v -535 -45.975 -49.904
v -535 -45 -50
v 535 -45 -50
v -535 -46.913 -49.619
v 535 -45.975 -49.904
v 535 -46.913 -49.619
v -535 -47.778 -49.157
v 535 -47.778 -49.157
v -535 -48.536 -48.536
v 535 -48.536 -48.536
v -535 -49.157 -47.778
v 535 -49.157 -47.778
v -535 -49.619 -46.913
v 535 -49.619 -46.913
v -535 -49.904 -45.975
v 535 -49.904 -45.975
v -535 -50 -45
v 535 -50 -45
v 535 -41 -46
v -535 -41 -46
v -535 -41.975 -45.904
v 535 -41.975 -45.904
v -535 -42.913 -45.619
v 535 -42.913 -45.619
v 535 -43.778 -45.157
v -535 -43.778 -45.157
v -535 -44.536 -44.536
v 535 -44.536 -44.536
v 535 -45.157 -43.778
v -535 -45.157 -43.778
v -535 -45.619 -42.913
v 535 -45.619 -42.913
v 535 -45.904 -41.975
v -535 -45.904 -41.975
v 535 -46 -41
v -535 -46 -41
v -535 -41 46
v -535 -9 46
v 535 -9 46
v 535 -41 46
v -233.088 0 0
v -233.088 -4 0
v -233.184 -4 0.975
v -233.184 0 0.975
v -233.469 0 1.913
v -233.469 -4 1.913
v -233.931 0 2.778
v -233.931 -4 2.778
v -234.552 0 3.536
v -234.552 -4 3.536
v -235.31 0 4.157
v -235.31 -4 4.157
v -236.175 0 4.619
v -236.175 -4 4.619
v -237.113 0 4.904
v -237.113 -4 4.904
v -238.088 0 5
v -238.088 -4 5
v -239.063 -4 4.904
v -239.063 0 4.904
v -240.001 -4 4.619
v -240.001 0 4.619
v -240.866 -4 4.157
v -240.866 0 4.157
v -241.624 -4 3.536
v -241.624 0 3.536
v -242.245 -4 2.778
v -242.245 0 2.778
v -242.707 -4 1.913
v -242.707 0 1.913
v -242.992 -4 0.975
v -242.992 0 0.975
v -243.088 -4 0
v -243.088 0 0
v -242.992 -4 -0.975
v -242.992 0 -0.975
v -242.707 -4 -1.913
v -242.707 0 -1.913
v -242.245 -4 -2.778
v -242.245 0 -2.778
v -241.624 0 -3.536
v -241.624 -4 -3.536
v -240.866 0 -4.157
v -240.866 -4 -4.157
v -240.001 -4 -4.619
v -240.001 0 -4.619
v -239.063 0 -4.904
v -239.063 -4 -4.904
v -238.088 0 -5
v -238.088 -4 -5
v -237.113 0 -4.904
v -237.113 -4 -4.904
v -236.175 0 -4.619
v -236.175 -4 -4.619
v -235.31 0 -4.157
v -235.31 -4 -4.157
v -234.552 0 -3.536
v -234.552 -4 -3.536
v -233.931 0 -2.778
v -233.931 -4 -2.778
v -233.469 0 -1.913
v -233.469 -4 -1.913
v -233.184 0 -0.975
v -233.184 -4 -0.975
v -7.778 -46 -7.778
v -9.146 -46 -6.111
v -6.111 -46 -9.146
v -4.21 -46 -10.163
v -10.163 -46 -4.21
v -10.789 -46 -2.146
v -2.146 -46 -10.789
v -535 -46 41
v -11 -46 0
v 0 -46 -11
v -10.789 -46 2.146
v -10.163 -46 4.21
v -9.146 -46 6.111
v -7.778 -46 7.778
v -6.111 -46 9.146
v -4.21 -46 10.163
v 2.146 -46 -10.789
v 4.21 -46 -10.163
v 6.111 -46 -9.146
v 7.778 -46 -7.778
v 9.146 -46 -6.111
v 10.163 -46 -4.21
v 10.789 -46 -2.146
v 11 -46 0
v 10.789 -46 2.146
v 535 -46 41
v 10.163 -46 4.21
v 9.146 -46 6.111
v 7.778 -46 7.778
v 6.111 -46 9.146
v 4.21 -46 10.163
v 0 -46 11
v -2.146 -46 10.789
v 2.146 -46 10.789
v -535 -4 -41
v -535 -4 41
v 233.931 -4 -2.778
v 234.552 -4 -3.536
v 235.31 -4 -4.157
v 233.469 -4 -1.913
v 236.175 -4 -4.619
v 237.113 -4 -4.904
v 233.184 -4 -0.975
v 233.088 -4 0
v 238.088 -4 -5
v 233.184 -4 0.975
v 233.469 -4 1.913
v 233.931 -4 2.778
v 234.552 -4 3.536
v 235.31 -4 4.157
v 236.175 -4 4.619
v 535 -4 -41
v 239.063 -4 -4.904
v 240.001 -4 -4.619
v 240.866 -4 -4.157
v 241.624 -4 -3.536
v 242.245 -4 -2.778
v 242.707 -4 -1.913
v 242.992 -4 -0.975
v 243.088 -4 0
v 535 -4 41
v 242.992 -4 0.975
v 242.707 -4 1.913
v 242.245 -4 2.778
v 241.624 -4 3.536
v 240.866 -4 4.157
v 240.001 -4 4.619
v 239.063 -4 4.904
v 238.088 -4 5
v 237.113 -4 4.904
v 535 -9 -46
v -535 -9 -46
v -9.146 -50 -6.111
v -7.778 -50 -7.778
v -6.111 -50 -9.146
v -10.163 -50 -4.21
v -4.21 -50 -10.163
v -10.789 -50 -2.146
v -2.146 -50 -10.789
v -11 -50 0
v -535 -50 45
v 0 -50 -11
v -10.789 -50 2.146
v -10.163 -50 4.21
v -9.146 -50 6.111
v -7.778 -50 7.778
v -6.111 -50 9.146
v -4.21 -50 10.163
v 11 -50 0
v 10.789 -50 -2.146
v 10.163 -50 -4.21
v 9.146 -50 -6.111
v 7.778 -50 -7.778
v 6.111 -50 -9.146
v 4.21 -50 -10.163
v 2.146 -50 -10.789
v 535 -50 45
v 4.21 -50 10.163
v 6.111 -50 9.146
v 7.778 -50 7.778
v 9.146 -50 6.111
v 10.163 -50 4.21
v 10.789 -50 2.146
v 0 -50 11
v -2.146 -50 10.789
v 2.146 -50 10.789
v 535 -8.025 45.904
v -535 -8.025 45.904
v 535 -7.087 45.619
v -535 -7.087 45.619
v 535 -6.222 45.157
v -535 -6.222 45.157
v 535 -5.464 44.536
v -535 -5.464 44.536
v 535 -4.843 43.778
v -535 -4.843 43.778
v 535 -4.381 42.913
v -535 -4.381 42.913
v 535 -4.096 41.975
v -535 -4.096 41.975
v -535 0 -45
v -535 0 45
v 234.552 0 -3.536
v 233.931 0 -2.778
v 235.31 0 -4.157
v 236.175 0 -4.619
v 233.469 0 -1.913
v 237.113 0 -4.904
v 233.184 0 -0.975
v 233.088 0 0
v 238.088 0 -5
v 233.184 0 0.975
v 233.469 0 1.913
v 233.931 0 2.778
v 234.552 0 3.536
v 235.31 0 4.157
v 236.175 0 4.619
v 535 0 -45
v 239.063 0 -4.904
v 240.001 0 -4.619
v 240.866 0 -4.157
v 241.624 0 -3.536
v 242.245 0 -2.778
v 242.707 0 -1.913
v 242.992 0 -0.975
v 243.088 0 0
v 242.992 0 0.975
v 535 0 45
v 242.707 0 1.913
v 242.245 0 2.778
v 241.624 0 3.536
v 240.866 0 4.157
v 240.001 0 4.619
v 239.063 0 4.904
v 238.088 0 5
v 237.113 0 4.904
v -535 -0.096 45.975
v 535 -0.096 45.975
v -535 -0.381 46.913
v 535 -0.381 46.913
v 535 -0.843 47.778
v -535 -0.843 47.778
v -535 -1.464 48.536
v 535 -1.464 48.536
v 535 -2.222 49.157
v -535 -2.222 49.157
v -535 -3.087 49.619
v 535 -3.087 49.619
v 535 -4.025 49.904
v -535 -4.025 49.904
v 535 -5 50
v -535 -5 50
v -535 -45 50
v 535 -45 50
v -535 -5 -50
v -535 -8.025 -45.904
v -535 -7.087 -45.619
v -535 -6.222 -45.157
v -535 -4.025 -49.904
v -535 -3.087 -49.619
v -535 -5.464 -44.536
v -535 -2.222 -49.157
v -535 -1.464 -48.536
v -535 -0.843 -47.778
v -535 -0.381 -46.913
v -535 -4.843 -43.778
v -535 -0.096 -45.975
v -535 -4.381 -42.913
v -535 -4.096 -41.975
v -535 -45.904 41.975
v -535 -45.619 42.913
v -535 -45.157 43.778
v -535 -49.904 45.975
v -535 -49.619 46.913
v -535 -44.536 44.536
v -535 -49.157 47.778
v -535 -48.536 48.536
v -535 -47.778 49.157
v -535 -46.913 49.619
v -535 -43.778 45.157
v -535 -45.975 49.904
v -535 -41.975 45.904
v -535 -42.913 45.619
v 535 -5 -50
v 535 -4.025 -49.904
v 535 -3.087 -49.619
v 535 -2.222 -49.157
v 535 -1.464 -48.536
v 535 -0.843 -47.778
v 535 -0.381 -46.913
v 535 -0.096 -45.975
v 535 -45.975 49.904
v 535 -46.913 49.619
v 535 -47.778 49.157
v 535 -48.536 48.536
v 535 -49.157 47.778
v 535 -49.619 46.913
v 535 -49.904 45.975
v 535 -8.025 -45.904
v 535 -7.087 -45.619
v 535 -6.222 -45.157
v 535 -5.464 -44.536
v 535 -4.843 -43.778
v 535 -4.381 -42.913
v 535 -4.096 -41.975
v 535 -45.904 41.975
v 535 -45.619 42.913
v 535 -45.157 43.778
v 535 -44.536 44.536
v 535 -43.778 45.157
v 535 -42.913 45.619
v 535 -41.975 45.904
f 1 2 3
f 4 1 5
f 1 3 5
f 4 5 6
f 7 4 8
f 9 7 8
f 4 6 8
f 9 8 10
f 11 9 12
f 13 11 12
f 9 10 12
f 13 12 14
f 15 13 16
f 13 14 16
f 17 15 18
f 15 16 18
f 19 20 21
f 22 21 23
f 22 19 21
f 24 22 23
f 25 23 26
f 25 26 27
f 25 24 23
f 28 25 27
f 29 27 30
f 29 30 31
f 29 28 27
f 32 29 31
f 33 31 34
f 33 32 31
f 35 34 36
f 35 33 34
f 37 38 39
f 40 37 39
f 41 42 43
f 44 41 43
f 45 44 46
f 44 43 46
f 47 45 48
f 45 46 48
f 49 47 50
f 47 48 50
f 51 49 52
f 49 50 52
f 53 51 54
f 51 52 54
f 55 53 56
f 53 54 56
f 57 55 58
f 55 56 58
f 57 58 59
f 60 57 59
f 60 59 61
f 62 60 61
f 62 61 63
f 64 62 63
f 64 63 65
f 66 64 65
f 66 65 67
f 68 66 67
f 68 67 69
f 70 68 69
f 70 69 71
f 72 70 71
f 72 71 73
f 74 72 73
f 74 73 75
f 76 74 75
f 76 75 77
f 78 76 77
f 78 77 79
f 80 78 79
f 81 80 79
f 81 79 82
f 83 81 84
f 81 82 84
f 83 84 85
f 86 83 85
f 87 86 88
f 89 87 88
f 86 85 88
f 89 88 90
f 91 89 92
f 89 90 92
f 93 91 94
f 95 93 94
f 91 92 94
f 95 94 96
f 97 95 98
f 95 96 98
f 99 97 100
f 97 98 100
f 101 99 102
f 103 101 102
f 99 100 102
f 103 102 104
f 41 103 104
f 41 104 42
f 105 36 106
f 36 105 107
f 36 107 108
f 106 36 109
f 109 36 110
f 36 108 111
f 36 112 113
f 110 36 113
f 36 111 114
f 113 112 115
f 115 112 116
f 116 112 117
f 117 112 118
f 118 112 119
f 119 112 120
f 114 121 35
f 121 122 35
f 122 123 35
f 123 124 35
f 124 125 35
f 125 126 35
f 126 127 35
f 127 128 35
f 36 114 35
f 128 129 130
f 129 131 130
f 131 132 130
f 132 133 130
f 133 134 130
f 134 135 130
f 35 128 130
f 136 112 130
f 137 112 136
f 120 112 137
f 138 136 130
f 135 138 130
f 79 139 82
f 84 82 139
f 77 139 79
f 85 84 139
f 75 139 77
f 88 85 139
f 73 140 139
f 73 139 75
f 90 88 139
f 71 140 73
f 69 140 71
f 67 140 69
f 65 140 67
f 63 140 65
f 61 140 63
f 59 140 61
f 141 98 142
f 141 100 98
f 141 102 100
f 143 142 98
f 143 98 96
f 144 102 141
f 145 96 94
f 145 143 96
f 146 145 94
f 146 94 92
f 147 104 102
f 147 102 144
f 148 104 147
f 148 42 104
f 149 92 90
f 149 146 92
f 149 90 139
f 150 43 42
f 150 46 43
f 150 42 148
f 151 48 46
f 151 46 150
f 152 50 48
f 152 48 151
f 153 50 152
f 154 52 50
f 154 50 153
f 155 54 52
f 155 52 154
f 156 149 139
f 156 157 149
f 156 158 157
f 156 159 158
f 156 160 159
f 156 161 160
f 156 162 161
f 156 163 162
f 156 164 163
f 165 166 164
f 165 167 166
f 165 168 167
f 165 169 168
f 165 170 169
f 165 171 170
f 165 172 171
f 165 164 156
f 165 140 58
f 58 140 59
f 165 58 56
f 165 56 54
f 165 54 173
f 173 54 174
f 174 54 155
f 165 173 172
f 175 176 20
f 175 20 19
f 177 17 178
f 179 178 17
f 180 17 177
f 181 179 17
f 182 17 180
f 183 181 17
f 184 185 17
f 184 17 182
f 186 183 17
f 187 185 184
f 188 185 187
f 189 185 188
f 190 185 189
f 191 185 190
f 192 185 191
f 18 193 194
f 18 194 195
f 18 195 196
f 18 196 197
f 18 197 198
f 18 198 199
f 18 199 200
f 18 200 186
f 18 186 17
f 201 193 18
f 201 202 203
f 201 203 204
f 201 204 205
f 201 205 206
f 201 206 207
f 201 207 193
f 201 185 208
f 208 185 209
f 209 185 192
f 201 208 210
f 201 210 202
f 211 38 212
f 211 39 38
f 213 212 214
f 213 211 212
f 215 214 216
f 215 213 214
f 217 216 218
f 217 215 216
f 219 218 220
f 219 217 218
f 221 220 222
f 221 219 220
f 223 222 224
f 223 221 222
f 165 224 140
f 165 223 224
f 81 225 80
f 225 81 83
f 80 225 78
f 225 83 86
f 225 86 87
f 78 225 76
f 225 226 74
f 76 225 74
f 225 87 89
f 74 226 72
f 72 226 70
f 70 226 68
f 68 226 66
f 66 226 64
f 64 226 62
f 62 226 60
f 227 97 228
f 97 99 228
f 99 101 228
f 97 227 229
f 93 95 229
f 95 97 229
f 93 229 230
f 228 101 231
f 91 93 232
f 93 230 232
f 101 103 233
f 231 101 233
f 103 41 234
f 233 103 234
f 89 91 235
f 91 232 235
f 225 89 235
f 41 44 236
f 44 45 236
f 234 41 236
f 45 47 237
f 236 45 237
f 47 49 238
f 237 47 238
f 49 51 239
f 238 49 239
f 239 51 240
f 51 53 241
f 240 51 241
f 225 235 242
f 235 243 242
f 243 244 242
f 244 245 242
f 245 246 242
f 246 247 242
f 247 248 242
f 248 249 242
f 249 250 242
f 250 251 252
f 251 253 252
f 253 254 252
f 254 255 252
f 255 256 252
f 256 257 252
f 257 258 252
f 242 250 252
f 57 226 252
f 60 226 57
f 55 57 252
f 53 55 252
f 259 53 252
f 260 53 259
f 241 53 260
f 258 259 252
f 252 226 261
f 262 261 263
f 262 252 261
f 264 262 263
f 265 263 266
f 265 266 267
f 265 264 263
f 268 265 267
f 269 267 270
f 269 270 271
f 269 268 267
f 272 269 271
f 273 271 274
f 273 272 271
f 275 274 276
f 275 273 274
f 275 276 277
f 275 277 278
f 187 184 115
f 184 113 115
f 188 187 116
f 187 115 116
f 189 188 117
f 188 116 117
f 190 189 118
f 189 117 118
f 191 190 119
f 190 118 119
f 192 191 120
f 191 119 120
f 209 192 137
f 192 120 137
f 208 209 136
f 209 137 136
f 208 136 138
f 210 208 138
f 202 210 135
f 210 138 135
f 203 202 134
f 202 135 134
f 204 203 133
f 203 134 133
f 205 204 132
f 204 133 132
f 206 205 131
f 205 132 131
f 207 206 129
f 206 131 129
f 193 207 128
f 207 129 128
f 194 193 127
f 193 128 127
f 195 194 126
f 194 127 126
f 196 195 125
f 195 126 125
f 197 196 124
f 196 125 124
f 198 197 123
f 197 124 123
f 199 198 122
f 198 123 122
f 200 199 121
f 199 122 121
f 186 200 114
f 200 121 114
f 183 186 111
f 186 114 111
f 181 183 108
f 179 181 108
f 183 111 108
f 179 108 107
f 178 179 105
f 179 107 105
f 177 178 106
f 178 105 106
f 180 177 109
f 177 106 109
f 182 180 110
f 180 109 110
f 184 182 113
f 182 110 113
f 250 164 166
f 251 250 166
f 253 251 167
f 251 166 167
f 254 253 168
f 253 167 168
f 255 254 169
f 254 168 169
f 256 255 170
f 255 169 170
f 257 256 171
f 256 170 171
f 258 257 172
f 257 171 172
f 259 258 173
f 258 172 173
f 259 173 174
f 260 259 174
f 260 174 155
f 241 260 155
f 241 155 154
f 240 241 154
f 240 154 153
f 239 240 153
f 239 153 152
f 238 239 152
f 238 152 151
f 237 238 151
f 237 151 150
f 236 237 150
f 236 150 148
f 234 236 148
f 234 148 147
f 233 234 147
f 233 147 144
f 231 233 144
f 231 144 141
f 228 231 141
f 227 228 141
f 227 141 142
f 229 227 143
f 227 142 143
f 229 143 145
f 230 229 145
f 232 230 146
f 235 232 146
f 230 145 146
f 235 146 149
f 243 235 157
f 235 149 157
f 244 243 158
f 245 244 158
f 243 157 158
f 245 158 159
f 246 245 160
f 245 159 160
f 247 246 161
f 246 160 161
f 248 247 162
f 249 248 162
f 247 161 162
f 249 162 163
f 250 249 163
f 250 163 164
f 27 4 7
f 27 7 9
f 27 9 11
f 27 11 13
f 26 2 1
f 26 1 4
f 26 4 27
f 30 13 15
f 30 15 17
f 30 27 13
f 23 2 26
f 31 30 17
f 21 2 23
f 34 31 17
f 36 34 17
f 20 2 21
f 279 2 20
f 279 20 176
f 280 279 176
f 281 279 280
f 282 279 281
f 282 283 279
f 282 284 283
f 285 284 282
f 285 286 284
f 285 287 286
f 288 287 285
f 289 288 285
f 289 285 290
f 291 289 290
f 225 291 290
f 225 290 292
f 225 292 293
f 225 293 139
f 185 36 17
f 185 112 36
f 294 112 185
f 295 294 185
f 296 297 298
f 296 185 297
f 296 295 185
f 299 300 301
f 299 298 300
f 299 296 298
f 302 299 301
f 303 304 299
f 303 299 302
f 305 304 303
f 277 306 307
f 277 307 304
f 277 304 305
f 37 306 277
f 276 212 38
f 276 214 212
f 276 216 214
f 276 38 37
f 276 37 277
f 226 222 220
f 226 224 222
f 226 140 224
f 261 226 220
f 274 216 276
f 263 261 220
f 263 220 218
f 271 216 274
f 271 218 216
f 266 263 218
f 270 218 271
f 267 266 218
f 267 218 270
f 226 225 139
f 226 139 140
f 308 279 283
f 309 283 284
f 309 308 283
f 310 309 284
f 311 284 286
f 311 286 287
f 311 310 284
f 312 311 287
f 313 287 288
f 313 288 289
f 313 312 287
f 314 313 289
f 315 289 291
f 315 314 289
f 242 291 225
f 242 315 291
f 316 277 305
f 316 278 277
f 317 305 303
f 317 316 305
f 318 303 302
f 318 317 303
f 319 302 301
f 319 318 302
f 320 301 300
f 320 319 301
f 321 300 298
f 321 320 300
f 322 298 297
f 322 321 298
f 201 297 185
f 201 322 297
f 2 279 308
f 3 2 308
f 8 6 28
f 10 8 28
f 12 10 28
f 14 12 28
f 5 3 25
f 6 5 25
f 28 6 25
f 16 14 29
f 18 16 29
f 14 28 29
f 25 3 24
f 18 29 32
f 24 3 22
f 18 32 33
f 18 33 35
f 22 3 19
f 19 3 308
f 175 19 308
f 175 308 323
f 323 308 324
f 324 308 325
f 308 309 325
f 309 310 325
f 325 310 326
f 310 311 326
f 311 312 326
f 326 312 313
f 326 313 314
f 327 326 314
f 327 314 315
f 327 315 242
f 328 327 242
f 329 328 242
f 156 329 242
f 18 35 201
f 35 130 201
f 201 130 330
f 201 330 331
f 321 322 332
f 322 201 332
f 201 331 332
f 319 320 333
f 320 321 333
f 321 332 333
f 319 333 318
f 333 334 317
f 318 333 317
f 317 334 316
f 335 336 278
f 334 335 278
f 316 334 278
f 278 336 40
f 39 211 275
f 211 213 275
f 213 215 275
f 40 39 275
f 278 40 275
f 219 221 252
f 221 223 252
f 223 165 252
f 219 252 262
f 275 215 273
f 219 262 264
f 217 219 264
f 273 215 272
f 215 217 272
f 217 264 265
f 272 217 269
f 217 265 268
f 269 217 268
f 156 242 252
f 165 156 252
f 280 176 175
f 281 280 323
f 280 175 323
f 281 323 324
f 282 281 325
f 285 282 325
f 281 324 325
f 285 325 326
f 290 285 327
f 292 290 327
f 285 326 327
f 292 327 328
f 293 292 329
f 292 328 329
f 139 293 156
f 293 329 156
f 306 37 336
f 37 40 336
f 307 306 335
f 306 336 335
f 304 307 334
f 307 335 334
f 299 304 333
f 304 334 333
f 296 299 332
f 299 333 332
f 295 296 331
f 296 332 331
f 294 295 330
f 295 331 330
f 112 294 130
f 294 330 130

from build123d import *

# Parameters (mm, degrees)
F0_W     = 1070
F0_H     = 100
F1_DEPTH = 50
F2_T     = -4
F3_R     = 5
F5_D     = 22
F5_DEPTH = 4
F5_TIP   = 6.6094668093
F7_D     = 10
F7_DEPTH = 5
F7_TIP   = 3.0043030951


with BuildPart() as f1:
    # F0 (on Front) → F1 (new body)
    with BuildSketch(Plane.XZ):
        Rectangle(F0_W, F0_H)
    extrude(amount=F1_DEPTH)

    # F2
    f2_openings = [f1.faces().sort_by_distance(p)[0] for p in [
        (-535, -25, 0),
        (535, -25, 0),
    ]]
    offset(amount=F2_T, openings=f2_openings)

    # F3
    f3_edges = [f1.edges().sort_by_distance(p)[0] for p in [
        (0, -46, 46),
        (0, -4, 46),
        (0, -46, -46),
        (0, -4, -46),
        (0, -50, -50),
        (0, -50, 50),
        (0, 0, 50),
        (0, 0, -50),
    ]]
    fillet(f3_edges, radius=F3_R)

    # F5
    with Locations(Plane.XZ.offset(50)):
        with Locations((0, 0)):
            Hole(F5_D / 2, depth=F5_DEPTH)
            with Locations((0, 0, -(F5_DEPTH + F5_TIP / 2))):  # 118° drill point
                Cone(0, F5_D / 2, F5_TIP, mode=Mode.SUBTRACT)

    # F7
    with Locations(Plane(origin=(0, 0, 0), x_dir=(-1, 0, 0), z_dir=(0, 1, 0))):
        with Locations((238.0880117416, 0), (-238.088, 0)):
            Hole(F7_D / 2, depth=F7_DEPTH)
            with Locations((0, 0, -(F7_DEPTH + F7_TIP / 2))):  # 118° drill point
                Cone(0, F7_D / 2, F7_TIP, mode=Mode.SUBTRACT)


solid = f1.part
